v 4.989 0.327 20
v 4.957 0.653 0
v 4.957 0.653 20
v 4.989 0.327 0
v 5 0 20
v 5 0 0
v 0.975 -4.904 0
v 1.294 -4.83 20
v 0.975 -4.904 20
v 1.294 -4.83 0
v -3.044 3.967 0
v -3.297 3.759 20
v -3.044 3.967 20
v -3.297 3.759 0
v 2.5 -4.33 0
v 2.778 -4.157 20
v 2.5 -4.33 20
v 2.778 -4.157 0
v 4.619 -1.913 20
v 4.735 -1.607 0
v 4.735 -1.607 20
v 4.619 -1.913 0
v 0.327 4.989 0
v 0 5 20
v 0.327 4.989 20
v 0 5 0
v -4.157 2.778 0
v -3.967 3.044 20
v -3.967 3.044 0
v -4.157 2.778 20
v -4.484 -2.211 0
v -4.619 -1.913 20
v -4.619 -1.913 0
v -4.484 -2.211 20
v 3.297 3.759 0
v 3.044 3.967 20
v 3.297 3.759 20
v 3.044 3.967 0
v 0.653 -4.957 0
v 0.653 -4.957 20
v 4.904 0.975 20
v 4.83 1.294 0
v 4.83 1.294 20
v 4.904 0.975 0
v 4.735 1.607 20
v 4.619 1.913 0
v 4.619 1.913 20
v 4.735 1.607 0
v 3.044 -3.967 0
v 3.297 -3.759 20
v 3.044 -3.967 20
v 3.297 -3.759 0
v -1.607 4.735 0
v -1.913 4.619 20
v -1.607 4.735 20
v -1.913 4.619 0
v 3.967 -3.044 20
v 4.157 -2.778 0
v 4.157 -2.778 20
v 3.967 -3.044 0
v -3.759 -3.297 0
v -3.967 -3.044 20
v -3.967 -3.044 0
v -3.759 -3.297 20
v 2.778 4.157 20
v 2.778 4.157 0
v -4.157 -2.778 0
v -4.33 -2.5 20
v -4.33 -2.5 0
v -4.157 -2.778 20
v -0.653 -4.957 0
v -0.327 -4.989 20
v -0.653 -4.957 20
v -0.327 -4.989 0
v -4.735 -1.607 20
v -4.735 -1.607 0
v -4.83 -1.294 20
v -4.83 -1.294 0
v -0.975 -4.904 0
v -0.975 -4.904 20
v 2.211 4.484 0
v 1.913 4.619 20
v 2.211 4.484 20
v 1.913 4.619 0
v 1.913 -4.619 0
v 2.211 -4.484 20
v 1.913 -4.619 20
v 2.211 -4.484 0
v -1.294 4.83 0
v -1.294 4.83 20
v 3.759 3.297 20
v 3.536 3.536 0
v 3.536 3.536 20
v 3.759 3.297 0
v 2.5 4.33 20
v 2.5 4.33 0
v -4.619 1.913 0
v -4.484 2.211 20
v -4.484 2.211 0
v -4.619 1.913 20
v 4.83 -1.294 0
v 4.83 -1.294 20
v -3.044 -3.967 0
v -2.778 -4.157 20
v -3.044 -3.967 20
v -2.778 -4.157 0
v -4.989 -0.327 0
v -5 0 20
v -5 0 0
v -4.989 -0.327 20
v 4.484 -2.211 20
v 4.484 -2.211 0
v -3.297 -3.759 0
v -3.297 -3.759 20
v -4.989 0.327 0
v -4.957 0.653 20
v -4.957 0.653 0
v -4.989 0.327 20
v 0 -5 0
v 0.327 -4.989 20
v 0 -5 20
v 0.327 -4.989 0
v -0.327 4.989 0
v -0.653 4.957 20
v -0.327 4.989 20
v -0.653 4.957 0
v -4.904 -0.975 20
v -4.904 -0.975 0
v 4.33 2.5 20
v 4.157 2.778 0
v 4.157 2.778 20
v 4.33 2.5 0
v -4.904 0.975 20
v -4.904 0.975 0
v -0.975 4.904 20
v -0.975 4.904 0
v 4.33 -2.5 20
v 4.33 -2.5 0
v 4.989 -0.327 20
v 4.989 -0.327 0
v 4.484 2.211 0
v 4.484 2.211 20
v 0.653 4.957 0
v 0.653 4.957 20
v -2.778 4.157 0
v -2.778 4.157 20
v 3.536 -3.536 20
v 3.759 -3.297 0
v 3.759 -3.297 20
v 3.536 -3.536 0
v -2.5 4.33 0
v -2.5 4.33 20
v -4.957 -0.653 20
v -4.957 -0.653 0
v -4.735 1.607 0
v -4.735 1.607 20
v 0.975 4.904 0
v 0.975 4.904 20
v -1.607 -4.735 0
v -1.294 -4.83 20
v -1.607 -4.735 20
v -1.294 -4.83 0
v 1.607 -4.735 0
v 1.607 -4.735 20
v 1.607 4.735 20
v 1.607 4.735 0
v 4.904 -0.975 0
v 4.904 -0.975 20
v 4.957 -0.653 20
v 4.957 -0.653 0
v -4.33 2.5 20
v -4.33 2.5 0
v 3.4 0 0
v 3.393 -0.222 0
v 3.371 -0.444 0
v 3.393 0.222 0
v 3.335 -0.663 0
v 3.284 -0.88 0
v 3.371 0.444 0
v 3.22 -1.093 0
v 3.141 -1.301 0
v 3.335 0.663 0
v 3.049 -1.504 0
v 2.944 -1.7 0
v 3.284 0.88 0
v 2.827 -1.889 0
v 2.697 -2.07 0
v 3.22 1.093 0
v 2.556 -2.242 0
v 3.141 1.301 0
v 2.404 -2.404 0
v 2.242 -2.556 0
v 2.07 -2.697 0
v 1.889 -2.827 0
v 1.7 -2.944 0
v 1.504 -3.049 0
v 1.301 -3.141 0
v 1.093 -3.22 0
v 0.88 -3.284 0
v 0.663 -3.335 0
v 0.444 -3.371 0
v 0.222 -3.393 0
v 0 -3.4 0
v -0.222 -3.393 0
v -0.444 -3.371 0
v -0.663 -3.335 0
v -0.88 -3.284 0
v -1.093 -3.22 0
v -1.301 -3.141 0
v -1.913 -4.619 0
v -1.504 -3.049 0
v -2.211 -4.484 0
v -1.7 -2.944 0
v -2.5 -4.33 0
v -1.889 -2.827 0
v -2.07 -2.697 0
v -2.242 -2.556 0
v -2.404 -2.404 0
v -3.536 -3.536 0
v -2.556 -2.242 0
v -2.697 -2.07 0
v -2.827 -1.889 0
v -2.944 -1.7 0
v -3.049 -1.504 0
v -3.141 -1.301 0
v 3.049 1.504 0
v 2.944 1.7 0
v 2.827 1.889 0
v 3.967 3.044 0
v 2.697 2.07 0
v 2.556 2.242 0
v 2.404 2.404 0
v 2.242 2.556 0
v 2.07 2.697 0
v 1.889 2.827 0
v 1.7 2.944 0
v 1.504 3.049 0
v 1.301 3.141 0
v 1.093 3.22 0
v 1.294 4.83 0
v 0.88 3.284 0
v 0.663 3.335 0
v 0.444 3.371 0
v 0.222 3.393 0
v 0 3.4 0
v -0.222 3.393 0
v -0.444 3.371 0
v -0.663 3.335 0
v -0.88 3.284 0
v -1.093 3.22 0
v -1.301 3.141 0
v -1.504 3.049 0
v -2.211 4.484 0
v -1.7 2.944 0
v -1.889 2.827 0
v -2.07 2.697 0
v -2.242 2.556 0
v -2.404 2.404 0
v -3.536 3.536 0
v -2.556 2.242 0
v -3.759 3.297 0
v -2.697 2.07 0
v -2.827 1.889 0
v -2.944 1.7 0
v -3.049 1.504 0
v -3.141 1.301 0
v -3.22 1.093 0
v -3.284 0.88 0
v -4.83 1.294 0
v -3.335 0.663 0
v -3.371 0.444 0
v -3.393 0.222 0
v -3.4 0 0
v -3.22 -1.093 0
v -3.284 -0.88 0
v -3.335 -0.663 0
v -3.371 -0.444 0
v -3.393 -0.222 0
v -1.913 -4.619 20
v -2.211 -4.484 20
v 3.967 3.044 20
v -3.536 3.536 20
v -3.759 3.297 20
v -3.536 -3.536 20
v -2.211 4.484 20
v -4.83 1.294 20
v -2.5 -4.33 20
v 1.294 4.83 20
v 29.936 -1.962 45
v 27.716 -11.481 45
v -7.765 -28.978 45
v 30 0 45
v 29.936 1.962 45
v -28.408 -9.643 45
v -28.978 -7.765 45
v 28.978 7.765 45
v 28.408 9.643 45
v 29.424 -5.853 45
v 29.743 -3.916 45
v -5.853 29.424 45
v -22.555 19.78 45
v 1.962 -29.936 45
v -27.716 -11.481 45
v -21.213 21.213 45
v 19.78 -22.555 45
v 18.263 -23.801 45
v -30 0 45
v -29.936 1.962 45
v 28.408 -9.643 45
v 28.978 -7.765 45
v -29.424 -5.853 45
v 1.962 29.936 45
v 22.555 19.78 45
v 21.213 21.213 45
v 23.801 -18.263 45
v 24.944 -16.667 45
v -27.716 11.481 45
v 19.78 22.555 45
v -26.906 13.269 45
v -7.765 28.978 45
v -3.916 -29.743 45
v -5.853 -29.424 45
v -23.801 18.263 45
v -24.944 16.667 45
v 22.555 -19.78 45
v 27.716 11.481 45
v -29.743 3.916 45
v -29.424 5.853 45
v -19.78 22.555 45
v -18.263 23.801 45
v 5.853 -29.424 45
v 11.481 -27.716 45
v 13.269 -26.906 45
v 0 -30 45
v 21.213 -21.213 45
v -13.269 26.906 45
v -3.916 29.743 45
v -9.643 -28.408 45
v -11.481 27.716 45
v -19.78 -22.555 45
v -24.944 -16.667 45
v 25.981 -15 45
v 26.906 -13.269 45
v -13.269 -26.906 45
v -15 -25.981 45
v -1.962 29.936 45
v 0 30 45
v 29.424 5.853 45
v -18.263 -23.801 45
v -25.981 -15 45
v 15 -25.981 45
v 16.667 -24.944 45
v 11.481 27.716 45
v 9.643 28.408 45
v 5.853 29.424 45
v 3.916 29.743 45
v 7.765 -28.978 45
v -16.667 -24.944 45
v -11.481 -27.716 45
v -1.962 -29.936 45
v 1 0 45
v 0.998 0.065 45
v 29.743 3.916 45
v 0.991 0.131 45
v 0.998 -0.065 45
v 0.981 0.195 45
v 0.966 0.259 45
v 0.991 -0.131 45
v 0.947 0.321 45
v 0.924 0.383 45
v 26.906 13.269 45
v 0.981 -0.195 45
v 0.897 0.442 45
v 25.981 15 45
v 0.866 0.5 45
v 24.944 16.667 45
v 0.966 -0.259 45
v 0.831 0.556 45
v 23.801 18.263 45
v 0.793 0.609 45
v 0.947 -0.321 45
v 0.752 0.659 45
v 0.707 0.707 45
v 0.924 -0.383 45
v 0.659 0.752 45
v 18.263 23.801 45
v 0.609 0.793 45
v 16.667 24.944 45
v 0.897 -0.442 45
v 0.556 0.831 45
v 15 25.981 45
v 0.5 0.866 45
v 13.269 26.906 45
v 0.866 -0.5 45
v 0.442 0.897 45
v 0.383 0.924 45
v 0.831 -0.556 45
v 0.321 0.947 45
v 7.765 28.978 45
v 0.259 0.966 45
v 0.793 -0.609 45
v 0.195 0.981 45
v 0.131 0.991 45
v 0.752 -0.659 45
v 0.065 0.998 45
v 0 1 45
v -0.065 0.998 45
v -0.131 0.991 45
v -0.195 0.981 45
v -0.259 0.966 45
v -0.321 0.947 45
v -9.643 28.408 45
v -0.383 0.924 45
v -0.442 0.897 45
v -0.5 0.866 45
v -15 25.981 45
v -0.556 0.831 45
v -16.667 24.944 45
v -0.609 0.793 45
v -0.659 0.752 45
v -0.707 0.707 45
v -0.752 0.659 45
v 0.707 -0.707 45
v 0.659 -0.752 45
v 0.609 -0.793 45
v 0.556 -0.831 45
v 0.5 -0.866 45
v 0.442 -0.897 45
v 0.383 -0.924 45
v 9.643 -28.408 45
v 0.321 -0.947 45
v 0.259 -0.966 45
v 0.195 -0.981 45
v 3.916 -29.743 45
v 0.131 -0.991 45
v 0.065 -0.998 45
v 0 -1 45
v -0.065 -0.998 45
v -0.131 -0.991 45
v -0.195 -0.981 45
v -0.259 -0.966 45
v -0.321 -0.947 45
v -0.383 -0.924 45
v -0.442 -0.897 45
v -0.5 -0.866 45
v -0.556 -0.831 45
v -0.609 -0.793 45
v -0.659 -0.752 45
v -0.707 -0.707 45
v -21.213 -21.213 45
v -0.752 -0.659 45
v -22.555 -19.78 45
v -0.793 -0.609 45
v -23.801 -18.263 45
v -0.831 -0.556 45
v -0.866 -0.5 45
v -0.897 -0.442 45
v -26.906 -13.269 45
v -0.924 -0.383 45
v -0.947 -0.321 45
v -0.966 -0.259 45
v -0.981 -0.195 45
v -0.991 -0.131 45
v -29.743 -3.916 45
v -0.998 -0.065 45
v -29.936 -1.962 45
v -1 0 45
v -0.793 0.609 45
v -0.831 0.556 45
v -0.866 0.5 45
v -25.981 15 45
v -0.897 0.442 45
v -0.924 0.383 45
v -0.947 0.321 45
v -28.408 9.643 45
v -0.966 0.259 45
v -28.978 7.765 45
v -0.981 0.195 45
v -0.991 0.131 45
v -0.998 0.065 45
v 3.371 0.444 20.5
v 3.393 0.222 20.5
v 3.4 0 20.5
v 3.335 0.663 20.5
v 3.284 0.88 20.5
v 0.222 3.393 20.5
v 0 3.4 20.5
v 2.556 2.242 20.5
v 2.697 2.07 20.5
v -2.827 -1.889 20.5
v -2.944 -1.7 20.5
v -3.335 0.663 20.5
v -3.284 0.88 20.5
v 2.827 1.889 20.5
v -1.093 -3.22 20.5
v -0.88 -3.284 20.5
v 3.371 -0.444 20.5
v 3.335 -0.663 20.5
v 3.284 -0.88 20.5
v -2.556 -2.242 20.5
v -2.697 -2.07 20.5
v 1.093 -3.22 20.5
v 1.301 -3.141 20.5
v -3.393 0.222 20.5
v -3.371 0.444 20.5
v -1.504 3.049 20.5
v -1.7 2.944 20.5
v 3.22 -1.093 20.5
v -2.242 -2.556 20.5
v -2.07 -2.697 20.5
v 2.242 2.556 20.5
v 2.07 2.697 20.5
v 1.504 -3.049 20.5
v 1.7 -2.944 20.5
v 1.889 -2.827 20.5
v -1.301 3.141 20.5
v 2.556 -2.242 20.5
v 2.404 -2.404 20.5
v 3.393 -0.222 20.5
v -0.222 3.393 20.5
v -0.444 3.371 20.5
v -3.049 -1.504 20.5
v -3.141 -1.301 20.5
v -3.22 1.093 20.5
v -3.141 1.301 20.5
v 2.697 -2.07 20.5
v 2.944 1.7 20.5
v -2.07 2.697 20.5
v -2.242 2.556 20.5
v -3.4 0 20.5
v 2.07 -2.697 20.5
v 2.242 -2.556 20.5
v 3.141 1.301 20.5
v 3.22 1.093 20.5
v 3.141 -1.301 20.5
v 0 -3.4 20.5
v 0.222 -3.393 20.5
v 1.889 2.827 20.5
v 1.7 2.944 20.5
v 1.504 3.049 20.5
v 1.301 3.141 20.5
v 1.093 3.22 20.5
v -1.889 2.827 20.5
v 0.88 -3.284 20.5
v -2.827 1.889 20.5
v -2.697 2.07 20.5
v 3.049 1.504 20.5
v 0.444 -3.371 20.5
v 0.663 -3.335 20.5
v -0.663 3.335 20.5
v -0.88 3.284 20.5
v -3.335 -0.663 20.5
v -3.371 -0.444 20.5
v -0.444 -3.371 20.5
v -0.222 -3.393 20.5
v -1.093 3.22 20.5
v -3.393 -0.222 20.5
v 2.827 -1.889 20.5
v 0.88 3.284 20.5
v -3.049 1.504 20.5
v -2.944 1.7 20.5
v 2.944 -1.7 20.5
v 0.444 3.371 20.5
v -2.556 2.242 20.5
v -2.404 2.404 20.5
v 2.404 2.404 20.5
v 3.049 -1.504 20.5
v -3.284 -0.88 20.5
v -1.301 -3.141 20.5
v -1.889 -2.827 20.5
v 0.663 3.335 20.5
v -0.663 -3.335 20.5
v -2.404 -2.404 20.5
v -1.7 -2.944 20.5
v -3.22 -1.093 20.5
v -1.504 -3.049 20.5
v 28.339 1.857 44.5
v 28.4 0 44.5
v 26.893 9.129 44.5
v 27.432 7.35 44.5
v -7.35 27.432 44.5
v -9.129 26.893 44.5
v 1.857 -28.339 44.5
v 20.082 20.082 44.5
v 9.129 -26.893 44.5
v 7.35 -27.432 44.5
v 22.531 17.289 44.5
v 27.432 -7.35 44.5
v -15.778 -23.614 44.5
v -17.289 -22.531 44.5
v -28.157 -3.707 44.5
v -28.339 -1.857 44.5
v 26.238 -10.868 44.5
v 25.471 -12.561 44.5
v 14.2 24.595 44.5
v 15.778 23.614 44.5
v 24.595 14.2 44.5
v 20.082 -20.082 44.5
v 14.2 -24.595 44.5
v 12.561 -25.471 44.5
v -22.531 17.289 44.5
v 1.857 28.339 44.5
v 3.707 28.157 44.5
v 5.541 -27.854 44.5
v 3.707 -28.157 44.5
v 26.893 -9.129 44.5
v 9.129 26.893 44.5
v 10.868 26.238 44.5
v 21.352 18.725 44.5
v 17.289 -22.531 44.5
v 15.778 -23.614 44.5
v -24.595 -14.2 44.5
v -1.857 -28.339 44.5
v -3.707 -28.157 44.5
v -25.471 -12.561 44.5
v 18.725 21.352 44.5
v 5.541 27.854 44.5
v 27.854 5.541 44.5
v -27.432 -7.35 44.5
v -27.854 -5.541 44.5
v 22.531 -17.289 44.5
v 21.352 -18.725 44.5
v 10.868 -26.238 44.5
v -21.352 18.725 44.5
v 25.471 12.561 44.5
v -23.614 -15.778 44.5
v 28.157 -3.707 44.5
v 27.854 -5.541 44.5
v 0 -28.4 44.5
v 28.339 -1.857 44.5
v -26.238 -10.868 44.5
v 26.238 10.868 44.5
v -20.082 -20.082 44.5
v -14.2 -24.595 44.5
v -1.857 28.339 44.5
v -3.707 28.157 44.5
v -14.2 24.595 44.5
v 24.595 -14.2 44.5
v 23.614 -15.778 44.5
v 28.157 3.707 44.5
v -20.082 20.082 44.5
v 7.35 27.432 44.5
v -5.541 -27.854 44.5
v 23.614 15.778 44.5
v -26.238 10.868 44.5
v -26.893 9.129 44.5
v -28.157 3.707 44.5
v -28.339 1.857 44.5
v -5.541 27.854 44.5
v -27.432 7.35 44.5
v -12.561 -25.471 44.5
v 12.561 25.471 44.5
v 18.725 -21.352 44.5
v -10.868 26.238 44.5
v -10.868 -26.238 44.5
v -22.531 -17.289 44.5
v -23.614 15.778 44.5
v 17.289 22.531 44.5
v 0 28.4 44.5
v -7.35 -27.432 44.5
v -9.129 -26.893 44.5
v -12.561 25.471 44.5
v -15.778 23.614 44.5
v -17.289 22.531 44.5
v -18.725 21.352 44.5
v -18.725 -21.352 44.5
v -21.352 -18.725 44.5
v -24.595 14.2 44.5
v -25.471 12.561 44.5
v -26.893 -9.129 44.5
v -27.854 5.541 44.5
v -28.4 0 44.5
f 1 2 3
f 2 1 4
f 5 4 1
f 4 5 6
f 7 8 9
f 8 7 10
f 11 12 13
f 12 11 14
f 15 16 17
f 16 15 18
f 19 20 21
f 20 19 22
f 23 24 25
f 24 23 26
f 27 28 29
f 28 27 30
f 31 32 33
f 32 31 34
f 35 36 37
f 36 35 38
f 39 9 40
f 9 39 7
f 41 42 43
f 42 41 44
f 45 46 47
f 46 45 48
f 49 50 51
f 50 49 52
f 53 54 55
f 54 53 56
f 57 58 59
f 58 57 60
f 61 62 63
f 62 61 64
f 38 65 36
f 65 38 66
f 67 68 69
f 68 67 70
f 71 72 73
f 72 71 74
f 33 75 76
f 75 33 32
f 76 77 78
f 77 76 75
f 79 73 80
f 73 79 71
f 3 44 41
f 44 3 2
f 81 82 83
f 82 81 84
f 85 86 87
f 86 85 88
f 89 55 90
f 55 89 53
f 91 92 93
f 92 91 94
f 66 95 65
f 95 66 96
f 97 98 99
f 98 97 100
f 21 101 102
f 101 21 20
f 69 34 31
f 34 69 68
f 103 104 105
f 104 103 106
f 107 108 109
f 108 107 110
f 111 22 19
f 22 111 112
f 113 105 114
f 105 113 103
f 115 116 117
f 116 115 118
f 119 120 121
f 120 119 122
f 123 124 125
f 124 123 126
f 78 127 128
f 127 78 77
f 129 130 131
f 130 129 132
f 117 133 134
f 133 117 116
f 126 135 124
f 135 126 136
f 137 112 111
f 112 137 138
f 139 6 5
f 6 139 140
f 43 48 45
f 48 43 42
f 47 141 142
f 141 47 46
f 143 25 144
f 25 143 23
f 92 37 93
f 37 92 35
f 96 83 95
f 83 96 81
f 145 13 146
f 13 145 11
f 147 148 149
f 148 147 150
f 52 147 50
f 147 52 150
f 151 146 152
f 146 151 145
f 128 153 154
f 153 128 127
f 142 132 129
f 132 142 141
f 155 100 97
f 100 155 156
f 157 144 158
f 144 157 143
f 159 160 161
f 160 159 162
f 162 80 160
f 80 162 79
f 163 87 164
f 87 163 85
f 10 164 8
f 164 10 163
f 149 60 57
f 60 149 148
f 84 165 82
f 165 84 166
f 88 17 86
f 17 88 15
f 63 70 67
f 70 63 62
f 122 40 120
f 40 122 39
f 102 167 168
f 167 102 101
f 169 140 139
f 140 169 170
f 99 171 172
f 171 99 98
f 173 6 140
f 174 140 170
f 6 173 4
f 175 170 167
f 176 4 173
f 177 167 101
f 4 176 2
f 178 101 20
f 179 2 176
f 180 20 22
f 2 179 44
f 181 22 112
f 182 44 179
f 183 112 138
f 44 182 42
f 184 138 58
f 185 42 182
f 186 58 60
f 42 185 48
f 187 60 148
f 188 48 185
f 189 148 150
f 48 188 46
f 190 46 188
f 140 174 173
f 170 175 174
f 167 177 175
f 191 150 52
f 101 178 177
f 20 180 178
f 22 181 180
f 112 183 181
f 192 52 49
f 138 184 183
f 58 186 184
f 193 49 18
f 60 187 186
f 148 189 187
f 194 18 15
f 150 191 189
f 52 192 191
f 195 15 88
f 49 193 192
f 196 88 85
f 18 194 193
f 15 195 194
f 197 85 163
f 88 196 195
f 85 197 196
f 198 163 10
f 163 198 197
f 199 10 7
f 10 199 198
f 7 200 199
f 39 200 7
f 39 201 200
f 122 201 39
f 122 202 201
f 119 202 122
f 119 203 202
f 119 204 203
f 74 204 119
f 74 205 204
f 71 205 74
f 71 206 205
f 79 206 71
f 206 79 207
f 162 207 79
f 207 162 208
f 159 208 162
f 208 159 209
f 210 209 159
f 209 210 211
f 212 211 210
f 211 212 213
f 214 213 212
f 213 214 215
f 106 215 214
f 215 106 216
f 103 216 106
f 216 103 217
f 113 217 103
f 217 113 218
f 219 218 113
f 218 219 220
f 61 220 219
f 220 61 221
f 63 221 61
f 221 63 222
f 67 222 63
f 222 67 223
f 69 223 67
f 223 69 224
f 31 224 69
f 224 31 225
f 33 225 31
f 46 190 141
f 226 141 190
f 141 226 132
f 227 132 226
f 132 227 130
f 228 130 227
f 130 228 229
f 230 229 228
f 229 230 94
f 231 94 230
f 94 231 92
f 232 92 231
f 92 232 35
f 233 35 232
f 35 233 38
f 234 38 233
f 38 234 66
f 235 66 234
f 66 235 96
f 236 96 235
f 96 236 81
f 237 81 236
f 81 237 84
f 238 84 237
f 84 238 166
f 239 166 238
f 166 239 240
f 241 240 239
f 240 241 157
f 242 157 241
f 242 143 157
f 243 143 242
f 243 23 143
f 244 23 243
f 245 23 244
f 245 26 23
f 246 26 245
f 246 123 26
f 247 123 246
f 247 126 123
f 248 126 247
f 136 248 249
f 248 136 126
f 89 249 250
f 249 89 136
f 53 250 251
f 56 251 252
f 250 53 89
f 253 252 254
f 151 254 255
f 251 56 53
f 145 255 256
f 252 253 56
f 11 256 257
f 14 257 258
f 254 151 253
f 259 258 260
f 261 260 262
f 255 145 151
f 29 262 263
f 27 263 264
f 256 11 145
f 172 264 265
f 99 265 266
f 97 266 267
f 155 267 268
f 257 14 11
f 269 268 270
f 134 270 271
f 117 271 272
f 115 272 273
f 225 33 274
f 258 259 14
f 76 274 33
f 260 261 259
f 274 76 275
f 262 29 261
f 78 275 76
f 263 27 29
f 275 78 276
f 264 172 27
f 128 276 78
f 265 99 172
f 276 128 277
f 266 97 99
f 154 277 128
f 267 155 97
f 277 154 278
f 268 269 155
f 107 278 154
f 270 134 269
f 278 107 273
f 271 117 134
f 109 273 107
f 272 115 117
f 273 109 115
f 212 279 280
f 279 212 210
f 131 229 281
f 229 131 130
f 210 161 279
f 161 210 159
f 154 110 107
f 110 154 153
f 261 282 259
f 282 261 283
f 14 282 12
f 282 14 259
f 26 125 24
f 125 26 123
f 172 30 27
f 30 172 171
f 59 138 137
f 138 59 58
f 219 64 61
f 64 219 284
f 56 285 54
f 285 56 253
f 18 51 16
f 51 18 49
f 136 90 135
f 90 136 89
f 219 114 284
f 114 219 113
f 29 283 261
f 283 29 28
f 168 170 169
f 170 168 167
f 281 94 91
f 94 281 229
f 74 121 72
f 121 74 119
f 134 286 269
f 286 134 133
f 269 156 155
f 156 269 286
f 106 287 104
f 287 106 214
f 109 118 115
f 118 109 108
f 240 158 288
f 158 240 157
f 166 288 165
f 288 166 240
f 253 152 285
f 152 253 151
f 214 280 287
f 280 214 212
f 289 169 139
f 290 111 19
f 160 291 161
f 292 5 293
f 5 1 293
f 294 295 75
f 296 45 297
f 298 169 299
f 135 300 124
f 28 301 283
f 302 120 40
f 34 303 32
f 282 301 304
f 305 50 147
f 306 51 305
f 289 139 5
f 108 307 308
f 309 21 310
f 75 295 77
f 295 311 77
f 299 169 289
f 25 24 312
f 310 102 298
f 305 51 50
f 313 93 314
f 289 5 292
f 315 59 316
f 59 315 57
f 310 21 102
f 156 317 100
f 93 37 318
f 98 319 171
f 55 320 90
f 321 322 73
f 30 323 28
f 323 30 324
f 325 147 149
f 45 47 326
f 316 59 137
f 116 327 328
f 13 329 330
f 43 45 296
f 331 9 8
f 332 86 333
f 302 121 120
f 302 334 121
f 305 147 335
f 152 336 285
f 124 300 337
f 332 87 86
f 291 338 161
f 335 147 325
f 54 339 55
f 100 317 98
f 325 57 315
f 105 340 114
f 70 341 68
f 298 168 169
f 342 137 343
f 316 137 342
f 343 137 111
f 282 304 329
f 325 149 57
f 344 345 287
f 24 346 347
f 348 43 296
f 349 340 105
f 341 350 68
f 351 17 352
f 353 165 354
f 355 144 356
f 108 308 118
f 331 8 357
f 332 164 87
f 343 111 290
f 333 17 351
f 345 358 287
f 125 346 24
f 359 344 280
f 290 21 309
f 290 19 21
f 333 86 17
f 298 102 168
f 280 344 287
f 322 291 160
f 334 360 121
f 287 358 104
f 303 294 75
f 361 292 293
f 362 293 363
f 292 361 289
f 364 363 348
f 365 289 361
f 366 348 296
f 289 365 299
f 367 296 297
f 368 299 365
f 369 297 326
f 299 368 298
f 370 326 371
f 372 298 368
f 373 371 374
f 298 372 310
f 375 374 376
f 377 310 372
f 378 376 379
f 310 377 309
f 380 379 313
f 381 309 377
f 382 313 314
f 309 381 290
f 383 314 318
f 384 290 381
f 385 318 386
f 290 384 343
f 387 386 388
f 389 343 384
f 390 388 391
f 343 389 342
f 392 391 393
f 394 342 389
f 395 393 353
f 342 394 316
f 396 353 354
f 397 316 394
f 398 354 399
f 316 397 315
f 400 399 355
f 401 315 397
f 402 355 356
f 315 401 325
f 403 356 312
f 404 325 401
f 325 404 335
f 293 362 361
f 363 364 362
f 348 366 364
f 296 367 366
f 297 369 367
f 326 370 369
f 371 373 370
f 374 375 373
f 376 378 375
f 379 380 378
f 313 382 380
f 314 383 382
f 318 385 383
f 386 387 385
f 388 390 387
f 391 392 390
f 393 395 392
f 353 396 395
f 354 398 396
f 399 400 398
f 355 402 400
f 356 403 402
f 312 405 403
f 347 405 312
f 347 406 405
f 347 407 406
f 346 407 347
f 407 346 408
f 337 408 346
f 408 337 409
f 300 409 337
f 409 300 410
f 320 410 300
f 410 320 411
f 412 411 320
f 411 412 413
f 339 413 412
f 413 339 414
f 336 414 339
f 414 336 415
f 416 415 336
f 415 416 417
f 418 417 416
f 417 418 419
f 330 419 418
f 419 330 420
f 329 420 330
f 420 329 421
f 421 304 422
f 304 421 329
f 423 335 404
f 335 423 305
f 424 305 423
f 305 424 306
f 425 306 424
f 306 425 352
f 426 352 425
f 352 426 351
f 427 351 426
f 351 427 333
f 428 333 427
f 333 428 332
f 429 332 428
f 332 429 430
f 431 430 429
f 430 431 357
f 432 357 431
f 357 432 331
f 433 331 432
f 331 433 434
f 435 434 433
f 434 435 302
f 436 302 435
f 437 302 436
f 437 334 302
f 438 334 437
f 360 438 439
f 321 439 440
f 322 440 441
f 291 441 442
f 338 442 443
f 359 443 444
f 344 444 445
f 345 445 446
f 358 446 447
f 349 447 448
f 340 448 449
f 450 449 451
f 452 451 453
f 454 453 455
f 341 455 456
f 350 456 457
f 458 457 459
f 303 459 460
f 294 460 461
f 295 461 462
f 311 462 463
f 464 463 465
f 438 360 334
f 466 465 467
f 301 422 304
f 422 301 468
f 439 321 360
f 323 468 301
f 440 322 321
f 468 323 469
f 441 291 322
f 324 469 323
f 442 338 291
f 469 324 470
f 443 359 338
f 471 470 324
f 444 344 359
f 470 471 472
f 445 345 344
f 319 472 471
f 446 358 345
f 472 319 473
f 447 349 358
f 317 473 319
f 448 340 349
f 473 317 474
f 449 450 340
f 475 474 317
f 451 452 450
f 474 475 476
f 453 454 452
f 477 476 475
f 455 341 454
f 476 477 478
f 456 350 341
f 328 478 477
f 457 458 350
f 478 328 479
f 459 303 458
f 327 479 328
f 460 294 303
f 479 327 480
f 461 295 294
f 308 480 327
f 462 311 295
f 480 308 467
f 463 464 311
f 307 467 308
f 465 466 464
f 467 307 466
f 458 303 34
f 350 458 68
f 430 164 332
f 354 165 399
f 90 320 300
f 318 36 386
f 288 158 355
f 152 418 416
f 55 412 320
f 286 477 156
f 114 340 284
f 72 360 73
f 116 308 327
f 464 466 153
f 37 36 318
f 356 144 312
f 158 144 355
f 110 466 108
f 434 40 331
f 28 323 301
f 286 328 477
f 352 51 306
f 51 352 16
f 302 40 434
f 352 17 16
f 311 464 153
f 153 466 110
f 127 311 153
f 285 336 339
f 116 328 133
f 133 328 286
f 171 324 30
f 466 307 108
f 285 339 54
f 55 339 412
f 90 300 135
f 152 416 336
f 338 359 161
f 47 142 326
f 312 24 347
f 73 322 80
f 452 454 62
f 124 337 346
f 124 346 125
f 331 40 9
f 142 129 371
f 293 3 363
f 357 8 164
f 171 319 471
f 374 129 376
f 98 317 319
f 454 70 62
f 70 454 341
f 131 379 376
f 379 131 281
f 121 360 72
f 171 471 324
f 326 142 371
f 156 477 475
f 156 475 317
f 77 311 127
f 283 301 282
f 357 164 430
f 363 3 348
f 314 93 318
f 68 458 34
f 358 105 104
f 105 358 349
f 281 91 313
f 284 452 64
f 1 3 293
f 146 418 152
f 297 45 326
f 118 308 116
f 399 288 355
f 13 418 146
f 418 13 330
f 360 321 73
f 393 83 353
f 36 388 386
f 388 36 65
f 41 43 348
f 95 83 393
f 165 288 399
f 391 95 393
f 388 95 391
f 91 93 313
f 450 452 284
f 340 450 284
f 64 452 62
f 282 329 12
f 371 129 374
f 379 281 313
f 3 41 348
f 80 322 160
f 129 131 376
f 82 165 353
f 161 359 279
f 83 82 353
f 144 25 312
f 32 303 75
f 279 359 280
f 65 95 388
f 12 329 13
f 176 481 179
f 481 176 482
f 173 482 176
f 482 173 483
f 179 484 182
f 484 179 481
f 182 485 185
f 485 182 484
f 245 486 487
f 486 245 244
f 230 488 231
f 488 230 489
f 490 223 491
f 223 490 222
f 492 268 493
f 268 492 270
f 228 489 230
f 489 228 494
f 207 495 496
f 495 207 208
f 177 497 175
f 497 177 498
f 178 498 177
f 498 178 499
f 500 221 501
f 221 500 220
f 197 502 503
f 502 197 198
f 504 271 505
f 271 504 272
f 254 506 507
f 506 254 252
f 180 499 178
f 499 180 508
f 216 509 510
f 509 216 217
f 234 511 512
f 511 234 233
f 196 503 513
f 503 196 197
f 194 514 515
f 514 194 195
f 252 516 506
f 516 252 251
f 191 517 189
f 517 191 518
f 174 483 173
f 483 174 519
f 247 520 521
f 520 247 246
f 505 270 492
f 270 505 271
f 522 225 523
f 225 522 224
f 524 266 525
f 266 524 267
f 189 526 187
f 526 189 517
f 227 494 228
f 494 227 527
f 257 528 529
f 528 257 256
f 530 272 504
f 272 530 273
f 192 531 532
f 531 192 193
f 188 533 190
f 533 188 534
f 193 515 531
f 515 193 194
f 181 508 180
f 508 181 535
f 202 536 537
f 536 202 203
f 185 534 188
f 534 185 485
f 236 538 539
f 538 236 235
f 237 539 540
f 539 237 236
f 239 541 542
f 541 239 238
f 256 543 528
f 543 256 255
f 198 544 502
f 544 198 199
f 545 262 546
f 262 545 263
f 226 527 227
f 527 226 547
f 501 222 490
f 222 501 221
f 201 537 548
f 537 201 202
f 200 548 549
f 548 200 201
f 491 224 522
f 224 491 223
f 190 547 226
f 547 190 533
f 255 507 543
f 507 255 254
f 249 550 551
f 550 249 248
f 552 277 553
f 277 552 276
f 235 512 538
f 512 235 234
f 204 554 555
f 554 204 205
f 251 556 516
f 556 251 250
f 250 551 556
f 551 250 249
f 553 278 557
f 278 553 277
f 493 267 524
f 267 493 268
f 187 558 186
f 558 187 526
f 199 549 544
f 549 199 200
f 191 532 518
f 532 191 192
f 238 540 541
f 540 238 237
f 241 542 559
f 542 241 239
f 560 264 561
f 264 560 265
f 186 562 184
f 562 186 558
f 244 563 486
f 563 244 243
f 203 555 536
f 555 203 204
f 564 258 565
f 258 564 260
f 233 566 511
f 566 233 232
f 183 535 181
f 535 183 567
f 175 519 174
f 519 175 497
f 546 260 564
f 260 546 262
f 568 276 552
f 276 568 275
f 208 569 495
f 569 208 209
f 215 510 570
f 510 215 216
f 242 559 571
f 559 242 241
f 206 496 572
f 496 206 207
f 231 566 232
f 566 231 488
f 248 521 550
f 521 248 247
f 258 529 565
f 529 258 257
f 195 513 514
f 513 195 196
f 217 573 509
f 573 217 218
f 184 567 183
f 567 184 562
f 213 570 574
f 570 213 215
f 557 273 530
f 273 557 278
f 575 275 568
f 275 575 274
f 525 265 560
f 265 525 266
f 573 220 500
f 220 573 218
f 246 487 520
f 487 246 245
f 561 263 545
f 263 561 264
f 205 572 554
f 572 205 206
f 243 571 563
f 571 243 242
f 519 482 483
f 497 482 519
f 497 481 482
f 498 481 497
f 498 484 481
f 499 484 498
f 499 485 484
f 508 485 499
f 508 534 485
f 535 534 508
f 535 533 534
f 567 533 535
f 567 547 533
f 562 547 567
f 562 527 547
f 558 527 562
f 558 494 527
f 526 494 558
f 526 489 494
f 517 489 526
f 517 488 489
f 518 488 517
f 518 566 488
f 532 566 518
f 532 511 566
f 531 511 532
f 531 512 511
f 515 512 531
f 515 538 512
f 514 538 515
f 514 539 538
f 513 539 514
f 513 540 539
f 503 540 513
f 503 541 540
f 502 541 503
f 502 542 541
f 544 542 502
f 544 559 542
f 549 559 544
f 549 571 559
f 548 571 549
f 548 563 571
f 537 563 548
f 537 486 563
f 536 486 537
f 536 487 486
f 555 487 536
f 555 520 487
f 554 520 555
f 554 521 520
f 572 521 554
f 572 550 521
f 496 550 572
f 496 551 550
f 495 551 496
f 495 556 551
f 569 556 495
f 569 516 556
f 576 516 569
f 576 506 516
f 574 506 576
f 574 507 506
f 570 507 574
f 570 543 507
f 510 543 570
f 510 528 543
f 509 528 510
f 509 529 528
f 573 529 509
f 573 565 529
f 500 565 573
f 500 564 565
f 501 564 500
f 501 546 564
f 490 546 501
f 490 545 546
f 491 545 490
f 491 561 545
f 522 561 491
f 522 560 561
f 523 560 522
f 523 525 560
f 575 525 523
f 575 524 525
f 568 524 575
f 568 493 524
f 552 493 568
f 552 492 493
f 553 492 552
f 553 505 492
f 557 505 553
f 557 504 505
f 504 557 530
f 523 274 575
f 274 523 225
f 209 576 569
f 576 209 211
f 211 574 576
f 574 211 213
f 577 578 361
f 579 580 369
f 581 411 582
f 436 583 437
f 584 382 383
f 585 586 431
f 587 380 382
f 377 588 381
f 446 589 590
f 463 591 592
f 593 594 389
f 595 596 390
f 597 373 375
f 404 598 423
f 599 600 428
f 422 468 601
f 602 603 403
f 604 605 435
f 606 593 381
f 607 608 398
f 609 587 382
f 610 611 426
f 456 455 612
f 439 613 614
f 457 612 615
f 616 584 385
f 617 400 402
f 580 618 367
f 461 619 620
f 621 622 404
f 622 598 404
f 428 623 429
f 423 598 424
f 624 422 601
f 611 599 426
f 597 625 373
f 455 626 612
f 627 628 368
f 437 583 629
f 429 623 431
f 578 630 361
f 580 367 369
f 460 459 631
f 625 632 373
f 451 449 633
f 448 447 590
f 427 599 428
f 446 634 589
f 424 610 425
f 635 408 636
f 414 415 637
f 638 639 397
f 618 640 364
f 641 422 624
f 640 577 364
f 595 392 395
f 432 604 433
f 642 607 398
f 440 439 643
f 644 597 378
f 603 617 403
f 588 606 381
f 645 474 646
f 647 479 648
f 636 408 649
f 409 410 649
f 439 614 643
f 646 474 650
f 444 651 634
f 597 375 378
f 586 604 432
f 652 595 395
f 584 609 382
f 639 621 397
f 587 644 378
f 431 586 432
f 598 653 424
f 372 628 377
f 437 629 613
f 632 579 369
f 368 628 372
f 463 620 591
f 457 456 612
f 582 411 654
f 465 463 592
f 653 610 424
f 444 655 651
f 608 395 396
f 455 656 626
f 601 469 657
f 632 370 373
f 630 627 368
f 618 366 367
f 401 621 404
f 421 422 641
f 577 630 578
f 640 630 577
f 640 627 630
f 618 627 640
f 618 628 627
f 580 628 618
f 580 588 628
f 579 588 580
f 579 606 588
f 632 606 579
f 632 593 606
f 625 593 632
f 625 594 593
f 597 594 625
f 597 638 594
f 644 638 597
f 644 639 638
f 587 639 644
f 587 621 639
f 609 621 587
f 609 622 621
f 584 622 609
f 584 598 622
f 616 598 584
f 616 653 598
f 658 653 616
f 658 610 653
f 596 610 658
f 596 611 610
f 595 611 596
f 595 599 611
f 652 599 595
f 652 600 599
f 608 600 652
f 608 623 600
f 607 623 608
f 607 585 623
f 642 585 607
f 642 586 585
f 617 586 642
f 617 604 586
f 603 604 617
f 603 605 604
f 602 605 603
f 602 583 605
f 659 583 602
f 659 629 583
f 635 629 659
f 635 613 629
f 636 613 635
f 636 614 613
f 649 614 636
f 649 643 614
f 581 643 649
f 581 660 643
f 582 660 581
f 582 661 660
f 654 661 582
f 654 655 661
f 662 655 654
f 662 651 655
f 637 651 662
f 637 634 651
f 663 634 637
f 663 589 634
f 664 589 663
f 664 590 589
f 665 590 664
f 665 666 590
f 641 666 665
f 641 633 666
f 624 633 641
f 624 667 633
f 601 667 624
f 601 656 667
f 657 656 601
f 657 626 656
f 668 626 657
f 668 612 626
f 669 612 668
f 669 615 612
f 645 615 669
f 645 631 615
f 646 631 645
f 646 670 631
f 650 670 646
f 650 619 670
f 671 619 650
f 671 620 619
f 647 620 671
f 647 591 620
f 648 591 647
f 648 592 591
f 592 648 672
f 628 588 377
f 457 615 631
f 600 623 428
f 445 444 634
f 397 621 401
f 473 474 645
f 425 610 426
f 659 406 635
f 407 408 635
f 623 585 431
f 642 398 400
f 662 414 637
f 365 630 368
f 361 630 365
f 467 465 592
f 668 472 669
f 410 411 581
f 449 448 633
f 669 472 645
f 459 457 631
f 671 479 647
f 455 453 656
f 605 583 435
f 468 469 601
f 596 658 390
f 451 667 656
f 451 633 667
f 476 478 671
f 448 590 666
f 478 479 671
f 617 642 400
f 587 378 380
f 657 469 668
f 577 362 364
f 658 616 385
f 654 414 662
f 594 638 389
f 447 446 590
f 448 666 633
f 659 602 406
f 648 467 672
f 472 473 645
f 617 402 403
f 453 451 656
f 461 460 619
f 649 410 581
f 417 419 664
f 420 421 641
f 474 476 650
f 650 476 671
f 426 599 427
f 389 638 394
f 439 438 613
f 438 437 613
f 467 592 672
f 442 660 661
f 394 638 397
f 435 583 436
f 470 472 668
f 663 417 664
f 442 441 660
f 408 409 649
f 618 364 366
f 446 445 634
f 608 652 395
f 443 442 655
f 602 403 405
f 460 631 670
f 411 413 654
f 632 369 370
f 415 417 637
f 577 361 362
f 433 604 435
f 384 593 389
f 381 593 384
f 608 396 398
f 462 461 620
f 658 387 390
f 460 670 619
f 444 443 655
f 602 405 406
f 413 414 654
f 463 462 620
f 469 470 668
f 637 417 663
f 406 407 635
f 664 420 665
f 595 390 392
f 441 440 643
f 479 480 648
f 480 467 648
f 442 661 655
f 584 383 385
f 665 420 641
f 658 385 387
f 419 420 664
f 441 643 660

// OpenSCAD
// Small lab funnel - printed upright, open top and bottom
// Units: mm

$fn = 96;

// --- Dimensions ---
spout_od      = 10;    // spout outer diameter
spout_h       = 20;    // spout height (z = 0 to 20)
cone_bottom_d = 10;    // cone outer diameter at spout junction (z = 20)
cone_top_d    = 60;    // cone rim outer diameter (z = 50)
wall          = 1.6;   // uniform wall thickness
eps           = 0.5;   // cutter overshoot past faces

total_h = spout_h + (cone_top_d - cone_bottom_d) / 2; // 50 mm

// --- Model ---
difference() {
    union() {
        // Spout (tube)
        cylinder(d = spout_od, h = spout_h);
        // Cone from spout junction to rim
        translate([0, 0, spout_h])
            cylinder(d1 = cone_bottom_d, d2 = cone_top_d, h = total_h - spout_h);
    }
    // Bottom hole through spout
    translate([0, 0, -eps])
        cylinder(d = spout_od - 2 * wall, h = spout_h + 2 * eps);
    // Cone opening at top rim
    translate([0, 0, total_h - eps])
        cylinder(d1 = cone_top_d - 2 * wall, h = eps);
}
